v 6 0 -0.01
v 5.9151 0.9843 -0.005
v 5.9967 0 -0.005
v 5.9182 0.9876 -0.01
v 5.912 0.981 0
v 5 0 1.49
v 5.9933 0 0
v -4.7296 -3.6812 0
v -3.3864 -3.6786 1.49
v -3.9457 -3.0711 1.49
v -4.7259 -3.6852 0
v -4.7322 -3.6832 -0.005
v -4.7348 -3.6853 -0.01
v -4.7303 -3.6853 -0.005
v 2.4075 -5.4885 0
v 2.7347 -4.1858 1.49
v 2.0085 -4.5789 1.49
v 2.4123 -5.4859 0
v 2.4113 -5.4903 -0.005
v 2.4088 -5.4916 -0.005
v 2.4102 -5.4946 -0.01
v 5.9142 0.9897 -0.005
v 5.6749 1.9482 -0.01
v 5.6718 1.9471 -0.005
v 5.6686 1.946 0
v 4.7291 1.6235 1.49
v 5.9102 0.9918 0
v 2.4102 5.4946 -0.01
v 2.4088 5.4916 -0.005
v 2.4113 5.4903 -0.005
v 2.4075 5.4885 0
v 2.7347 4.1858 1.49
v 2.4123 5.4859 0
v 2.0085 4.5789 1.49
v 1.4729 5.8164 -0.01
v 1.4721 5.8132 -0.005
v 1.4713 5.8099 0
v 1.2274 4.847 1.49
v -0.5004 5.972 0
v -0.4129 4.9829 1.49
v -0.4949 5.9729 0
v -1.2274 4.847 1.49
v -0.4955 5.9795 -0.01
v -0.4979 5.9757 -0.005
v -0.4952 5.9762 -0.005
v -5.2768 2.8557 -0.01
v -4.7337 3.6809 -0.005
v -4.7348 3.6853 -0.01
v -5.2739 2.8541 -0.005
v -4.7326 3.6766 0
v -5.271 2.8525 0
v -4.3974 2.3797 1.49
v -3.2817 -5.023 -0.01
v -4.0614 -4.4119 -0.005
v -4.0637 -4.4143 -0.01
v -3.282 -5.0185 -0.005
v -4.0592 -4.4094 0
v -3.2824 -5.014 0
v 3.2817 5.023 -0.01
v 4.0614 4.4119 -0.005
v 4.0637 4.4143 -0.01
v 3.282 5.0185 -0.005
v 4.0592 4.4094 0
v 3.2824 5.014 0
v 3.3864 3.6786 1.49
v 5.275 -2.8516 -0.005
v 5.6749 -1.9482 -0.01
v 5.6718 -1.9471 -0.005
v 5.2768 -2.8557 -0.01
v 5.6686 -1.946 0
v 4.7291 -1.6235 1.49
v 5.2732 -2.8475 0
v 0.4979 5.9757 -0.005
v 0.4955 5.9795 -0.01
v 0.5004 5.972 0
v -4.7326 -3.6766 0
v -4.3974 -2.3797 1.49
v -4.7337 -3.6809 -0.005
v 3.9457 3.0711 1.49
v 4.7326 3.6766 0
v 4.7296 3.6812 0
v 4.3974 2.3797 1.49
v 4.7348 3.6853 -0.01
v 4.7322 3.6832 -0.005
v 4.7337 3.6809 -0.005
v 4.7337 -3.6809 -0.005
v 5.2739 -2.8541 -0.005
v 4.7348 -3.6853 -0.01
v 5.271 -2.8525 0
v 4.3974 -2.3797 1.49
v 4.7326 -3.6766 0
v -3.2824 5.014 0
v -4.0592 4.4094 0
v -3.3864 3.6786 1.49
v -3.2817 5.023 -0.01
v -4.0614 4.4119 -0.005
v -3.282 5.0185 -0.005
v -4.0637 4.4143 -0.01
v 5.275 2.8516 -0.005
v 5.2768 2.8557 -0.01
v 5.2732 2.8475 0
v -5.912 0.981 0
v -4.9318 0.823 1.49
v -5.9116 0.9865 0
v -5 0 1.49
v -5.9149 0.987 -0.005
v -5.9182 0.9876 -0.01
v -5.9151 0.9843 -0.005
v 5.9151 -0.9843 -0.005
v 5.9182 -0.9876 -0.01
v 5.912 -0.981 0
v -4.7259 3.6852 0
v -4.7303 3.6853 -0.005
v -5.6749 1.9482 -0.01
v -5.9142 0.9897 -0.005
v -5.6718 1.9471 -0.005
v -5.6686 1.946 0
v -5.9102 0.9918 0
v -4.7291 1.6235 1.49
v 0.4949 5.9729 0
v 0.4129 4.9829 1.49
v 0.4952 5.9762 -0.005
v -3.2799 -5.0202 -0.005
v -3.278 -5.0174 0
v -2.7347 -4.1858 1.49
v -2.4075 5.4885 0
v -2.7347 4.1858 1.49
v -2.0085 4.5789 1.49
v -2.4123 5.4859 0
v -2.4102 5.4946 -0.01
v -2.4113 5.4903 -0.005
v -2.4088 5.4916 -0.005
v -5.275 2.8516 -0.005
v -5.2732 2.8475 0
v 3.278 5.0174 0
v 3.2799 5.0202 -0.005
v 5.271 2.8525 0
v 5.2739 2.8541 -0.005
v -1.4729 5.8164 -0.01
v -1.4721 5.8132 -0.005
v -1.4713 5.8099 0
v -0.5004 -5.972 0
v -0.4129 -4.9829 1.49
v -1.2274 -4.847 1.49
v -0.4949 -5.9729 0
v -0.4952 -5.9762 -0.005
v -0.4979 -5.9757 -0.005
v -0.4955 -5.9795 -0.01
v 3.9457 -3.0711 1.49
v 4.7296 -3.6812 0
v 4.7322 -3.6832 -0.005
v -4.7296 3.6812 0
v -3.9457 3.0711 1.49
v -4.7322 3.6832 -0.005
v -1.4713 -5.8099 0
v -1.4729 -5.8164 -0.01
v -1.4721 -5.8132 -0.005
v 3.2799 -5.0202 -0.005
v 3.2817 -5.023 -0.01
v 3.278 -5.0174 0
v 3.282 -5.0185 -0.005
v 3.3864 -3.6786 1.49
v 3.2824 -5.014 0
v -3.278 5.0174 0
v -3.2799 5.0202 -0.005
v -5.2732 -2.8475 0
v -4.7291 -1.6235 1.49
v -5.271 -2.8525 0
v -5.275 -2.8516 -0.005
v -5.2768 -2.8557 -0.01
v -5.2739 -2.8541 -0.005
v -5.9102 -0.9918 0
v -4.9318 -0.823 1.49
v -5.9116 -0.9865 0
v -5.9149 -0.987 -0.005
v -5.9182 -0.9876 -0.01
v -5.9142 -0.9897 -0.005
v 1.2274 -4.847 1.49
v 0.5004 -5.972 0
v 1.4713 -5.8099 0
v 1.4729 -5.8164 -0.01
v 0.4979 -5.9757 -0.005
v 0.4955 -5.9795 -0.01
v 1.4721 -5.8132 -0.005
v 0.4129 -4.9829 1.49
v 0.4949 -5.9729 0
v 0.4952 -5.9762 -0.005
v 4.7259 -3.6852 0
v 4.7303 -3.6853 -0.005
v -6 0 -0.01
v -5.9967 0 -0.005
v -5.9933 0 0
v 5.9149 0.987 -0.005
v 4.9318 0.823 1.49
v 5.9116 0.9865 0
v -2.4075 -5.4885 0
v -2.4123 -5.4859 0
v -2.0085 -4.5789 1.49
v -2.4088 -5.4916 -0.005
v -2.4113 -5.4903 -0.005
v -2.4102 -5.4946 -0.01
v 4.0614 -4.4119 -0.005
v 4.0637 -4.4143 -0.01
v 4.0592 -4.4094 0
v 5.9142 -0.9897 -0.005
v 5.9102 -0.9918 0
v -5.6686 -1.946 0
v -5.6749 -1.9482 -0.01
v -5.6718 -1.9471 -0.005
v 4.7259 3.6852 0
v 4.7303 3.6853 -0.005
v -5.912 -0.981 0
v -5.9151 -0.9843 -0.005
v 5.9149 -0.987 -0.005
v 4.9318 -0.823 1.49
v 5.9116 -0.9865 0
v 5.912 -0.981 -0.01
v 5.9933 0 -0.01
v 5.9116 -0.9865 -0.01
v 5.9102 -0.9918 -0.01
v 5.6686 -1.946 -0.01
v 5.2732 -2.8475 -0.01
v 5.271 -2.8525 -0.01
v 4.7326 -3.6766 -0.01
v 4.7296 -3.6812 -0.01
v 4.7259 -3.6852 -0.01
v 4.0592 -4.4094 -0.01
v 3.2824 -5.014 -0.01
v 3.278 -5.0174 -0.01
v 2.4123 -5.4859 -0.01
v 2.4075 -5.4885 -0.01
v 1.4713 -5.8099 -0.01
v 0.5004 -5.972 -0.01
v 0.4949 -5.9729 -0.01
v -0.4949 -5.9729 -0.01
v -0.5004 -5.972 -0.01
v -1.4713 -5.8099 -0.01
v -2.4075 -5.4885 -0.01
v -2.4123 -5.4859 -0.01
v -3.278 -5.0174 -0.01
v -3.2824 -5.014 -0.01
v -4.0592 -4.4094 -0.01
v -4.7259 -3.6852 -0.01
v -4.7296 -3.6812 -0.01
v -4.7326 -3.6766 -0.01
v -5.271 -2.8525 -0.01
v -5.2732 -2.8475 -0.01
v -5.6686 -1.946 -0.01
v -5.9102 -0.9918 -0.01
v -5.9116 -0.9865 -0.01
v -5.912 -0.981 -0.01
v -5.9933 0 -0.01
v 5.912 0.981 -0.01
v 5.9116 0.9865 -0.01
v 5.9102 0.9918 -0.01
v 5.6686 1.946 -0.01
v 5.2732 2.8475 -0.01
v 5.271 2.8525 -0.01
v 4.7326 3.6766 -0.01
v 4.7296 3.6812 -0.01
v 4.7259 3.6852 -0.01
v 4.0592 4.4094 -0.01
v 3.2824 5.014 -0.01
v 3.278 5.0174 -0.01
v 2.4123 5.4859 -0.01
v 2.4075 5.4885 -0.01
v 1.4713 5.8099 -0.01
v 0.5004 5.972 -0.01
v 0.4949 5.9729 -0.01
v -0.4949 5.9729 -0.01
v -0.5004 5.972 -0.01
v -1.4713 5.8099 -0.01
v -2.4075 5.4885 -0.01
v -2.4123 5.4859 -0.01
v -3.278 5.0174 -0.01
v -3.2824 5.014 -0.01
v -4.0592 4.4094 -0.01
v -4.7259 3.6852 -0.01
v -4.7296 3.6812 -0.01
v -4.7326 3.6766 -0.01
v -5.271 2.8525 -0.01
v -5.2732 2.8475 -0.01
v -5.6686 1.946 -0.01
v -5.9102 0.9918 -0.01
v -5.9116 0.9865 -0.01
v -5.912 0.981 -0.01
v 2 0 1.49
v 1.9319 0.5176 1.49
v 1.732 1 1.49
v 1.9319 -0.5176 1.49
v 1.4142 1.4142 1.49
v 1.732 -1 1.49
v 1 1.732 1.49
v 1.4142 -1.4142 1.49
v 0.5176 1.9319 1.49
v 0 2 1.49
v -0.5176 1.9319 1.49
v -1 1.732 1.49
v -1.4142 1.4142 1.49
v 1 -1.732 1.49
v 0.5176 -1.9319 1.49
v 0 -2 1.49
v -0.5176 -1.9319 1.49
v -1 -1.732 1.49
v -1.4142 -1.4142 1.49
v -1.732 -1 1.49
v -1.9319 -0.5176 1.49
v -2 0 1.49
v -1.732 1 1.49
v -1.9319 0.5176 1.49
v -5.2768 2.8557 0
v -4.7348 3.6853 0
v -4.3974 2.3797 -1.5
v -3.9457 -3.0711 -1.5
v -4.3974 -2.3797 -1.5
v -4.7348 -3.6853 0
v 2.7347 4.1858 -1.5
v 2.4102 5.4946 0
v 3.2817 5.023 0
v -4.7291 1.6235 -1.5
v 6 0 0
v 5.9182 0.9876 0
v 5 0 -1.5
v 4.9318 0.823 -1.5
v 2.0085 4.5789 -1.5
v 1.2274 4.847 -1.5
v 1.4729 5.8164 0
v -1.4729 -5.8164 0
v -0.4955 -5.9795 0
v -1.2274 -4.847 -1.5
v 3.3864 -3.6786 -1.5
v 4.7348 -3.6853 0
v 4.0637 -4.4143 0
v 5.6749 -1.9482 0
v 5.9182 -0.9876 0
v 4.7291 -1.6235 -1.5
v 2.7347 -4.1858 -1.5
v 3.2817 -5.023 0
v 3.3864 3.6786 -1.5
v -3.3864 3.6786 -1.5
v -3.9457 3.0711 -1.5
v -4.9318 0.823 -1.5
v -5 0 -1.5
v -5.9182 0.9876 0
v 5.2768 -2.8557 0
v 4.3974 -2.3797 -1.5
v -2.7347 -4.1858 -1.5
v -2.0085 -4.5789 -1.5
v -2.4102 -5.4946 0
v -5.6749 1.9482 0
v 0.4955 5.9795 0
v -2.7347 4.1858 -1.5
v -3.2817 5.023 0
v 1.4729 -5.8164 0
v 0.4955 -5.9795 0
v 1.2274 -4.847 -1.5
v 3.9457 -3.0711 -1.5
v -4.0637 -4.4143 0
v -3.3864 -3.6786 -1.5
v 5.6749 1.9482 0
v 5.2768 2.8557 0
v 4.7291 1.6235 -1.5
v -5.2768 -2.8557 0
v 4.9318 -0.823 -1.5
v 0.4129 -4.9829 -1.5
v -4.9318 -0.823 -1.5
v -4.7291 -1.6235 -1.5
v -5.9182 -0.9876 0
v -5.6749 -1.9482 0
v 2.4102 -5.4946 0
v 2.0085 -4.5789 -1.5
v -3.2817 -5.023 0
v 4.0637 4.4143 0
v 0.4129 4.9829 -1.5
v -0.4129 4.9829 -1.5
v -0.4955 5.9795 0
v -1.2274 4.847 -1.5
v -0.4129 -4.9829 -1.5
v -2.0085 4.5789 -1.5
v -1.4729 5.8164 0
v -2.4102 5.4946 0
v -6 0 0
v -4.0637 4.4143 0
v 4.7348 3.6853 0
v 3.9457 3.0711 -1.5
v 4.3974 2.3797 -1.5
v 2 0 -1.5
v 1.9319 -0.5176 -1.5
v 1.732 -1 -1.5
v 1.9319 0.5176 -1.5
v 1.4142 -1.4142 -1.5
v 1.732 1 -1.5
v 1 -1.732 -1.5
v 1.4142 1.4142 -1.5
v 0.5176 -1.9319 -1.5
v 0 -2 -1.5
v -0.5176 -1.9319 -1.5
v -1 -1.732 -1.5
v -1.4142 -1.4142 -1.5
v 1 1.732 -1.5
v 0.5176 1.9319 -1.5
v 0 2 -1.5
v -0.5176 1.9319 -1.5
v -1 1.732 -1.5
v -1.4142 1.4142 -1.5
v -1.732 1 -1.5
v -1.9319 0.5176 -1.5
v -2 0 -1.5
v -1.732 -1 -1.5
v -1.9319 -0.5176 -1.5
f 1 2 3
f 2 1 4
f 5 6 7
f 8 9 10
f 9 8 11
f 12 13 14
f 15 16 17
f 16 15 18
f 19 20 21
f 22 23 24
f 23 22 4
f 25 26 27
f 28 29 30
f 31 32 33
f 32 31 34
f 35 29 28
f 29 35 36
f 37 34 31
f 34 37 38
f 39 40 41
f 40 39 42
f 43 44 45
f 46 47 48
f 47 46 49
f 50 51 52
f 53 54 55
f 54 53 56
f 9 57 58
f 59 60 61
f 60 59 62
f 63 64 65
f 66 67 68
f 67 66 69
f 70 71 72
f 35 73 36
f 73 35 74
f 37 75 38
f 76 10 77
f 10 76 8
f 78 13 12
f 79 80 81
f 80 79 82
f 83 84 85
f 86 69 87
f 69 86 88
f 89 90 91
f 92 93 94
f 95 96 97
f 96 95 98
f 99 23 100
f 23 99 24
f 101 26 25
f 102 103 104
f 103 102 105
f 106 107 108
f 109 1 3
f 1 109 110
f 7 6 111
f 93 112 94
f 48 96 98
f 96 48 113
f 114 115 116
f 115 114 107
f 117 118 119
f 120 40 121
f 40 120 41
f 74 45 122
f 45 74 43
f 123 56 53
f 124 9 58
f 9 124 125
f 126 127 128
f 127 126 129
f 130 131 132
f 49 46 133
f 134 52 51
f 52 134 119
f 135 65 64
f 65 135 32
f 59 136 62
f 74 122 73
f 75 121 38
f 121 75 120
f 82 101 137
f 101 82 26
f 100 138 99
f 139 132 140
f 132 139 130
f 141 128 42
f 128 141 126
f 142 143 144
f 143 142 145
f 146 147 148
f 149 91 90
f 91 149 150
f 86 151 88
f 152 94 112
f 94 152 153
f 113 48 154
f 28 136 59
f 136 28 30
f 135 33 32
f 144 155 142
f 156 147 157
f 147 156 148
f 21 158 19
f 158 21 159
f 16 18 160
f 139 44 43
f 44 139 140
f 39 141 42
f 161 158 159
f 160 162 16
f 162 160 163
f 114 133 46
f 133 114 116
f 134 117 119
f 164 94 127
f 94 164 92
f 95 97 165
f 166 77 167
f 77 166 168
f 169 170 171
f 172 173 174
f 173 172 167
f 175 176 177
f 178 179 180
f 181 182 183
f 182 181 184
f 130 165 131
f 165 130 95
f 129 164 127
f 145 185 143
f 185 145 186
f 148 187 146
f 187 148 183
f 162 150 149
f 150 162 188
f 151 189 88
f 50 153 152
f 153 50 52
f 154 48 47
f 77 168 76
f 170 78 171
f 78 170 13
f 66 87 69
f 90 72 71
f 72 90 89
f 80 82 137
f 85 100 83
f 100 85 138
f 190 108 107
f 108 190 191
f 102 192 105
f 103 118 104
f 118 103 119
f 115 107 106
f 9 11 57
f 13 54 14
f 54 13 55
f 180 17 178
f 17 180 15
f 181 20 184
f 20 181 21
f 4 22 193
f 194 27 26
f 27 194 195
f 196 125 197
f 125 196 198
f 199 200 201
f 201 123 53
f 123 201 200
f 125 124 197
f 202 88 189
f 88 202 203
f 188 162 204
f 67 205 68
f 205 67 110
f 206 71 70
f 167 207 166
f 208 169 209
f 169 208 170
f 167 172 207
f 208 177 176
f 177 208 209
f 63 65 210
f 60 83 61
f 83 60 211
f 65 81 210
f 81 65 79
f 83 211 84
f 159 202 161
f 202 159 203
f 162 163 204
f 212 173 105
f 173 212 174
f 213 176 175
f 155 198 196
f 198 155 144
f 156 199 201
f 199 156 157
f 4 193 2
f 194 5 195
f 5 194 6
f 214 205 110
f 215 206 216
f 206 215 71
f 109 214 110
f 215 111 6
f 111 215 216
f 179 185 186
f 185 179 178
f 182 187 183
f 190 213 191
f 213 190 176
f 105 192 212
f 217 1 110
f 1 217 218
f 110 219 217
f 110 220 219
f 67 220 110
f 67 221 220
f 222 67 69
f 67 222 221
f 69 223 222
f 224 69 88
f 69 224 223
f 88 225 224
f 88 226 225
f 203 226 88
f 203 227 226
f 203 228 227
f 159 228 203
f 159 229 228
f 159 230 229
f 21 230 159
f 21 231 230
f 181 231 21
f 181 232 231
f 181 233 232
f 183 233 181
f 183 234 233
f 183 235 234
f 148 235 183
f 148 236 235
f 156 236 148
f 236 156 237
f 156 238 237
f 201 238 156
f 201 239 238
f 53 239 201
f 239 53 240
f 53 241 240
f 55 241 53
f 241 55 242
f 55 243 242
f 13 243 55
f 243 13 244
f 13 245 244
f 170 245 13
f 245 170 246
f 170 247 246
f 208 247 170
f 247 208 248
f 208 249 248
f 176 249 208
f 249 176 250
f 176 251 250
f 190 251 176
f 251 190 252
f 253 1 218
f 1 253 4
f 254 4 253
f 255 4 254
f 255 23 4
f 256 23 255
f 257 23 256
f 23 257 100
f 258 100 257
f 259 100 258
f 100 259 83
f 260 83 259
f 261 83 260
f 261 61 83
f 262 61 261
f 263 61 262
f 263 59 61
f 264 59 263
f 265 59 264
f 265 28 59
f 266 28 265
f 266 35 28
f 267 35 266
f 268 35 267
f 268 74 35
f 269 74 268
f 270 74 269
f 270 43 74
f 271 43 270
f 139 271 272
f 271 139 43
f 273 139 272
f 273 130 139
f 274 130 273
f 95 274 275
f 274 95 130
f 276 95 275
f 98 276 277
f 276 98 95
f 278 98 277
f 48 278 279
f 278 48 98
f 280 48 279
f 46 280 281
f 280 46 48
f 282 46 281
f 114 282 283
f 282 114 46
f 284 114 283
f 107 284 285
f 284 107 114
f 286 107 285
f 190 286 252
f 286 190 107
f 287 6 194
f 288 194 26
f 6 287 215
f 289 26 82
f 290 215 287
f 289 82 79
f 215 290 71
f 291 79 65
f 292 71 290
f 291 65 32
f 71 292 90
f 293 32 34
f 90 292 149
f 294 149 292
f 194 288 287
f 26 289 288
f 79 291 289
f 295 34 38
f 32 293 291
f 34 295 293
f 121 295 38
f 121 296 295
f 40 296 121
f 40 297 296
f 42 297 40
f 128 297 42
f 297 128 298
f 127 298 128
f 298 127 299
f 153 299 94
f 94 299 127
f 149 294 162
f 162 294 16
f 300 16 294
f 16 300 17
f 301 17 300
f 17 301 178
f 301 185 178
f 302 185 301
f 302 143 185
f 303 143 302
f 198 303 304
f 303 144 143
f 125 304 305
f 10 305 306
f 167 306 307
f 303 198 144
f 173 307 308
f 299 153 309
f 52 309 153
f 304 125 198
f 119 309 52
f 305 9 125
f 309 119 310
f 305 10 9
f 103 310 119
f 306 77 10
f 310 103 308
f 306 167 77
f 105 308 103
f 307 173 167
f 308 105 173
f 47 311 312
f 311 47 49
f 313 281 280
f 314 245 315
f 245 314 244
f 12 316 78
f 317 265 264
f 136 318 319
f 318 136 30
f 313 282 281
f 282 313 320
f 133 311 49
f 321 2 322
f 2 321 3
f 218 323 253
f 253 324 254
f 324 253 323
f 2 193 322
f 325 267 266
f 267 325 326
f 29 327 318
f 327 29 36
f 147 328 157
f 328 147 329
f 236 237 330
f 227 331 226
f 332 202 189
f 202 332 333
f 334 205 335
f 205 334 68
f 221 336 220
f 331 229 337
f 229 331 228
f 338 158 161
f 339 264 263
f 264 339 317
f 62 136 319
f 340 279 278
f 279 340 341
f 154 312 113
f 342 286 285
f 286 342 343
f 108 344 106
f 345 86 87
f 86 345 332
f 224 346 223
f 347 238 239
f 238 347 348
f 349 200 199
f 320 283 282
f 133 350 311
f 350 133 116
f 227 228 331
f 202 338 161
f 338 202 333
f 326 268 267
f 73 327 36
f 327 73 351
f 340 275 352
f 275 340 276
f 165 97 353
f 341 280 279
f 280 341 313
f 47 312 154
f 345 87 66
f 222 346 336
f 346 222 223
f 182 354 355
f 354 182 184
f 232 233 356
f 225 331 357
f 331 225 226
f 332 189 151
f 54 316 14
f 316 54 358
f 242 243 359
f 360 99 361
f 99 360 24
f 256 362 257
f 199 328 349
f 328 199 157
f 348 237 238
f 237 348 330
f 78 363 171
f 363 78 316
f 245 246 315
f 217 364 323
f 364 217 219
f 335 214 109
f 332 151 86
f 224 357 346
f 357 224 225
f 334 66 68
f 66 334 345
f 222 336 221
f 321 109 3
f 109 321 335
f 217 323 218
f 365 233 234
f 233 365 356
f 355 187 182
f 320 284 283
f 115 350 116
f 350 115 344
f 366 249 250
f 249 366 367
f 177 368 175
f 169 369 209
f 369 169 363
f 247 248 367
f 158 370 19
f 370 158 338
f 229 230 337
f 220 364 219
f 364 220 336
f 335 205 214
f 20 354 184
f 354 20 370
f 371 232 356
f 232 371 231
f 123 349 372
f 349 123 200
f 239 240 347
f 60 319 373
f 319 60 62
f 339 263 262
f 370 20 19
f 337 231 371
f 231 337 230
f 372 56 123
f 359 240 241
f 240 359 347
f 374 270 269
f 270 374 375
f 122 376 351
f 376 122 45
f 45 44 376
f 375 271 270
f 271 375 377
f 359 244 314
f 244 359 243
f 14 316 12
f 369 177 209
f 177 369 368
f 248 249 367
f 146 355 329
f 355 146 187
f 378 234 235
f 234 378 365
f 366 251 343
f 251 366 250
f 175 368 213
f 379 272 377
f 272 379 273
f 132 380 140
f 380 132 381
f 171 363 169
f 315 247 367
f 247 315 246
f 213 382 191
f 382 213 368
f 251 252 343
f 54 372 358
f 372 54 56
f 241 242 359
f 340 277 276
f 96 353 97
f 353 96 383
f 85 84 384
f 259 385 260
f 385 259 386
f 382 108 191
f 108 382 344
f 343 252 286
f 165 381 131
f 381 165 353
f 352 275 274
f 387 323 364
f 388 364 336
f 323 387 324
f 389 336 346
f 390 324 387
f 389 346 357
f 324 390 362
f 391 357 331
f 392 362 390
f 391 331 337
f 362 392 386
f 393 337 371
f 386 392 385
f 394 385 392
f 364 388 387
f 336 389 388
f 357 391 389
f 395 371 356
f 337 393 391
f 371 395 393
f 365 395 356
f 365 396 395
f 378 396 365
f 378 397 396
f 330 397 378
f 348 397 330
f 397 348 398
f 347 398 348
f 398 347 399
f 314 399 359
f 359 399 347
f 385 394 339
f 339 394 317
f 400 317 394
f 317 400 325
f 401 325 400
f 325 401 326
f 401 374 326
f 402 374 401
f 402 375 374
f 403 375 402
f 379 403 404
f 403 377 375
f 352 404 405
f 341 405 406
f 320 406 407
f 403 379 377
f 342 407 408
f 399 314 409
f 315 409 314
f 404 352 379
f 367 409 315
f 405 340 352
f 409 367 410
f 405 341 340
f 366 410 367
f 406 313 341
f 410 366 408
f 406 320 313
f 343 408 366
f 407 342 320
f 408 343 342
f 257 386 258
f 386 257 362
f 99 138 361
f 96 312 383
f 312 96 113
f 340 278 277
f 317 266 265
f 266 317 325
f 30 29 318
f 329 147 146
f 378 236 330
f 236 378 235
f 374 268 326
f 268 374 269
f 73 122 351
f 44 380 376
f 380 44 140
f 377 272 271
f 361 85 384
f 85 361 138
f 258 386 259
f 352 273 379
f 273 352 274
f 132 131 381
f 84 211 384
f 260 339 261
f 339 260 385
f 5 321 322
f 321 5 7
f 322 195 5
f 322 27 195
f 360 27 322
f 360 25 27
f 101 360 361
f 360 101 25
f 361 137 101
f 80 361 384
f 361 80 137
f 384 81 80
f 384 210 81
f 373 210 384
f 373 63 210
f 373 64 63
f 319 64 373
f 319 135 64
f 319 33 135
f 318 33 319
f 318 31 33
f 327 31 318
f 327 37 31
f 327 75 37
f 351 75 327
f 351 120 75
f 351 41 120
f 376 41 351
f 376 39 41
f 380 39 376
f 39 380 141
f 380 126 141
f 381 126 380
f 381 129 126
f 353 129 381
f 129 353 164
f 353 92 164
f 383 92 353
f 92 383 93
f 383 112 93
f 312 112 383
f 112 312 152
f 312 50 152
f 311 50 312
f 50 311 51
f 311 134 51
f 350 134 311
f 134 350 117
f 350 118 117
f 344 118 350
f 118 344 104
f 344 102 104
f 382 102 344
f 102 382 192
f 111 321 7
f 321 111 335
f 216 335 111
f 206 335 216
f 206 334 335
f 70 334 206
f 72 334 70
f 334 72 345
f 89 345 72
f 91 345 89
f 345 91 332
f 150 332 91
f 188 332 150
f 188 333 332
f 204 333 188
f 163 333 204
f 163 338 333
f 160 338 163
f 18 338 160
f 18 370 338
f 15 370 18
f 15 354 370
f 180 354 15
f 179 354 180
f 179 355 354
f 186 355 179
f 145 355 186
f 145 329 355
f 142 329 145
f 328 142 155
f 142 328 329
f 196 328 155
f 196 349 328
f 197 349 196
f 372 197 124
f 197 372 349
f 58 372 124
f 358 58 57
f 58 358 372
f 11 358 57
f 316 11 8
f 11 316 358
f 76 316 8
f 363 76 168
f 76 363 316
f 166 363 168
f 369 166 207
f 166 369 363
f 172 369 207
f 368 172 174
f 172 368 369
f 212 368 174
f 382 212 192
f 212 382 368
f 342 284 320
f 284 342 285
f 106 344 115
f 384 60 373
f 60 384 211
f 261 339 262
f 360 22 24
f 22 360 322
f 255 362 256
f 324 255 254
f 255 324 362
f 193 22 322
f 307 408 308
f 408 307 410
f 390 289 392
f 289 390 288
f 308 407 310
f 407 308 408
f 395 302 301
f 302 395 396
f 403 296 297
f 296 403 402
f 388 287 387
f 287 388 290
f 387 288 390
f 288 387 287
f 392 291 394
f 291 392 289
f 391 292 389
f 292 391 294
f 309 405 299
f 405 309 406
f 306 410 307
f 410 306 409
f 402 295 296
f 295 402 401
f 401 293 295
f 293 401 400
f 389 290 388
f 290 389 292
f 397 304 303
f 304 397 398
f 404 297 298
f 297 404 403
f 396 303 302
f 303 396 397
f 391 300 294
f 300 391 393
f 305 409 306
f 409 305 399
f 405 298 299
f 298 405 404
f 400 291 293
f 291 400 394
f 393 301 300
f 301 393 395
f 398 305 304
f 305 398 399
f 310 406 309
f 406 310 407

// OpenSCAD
//frame
thick=3;
bead=12;
rod=54.5;
ep=0.01;
$fa=1;
$fs=1;
module frame()
{
    difference()
    {
        translate([0,0,5])cube([rod+thick,3*bead+thick*2+thick*3,15],center=true);
        translate([0,0,5])cube([rod-thick,3*bead+thick*2+thick,20],center=true);
        translate([0,0,ep])rod_slot();
        translate([0,(bead+thick/2),ep])rod_slot();
        translate([0,-(bead+thick/2),ep])rod_slot();
    }
}
module rod_slot()
{
    translate([0,0,10-thick/2])cube([rod+.4,thick+.2,thick+.2],center=true);
}

module rod()
{
    difference()
    {
        rotate([0,90,0])cylinder(r=(thick+.4)/2,h=rod,center=true,$fn=24);
        translate([0,0,(thick-.1)])cube([rod*2,thick*4,thick],center=true);
        translate([0,0,-(thick-.1)])cube([rod*2,thick*4,thick],center=true);
    }
}
module bead()
{
    translate([0,0,thick/4])difference()
    {
        union()
        {
            translate([0,0,-ep])cylinder(r1=bead/2,r2=bead/2-1,h=thick/2,center=true);
            translate([0,0,-(thick/2)])cylinder(r2=bead/2,r1=bead/2-1,h=thick/2,center=true);
        }
        cylinder(r=(thick+1)/2,h=thick*4,center=true,$fn=24);
    }
}
bead();

//rod();
//frame();
//split frame
module split_frame()
{
    difference()
    {
        translate([0,0,5])cube([rod+thick,bead+thick*2+thick*2,12],center=true);
        translate([0,0,5])cube([rod-thick,bead+thick*2+thick*0,20],center=true);
        translate([0,0,ep])rod_slot();
    }
    //inner
    difference()
    {
        translate([thick/2,0,5])cube([thick,bead+thick*4,12],center=true);
        translate([0,0,ep])rod_slot();
    }
}

//split_frame();
